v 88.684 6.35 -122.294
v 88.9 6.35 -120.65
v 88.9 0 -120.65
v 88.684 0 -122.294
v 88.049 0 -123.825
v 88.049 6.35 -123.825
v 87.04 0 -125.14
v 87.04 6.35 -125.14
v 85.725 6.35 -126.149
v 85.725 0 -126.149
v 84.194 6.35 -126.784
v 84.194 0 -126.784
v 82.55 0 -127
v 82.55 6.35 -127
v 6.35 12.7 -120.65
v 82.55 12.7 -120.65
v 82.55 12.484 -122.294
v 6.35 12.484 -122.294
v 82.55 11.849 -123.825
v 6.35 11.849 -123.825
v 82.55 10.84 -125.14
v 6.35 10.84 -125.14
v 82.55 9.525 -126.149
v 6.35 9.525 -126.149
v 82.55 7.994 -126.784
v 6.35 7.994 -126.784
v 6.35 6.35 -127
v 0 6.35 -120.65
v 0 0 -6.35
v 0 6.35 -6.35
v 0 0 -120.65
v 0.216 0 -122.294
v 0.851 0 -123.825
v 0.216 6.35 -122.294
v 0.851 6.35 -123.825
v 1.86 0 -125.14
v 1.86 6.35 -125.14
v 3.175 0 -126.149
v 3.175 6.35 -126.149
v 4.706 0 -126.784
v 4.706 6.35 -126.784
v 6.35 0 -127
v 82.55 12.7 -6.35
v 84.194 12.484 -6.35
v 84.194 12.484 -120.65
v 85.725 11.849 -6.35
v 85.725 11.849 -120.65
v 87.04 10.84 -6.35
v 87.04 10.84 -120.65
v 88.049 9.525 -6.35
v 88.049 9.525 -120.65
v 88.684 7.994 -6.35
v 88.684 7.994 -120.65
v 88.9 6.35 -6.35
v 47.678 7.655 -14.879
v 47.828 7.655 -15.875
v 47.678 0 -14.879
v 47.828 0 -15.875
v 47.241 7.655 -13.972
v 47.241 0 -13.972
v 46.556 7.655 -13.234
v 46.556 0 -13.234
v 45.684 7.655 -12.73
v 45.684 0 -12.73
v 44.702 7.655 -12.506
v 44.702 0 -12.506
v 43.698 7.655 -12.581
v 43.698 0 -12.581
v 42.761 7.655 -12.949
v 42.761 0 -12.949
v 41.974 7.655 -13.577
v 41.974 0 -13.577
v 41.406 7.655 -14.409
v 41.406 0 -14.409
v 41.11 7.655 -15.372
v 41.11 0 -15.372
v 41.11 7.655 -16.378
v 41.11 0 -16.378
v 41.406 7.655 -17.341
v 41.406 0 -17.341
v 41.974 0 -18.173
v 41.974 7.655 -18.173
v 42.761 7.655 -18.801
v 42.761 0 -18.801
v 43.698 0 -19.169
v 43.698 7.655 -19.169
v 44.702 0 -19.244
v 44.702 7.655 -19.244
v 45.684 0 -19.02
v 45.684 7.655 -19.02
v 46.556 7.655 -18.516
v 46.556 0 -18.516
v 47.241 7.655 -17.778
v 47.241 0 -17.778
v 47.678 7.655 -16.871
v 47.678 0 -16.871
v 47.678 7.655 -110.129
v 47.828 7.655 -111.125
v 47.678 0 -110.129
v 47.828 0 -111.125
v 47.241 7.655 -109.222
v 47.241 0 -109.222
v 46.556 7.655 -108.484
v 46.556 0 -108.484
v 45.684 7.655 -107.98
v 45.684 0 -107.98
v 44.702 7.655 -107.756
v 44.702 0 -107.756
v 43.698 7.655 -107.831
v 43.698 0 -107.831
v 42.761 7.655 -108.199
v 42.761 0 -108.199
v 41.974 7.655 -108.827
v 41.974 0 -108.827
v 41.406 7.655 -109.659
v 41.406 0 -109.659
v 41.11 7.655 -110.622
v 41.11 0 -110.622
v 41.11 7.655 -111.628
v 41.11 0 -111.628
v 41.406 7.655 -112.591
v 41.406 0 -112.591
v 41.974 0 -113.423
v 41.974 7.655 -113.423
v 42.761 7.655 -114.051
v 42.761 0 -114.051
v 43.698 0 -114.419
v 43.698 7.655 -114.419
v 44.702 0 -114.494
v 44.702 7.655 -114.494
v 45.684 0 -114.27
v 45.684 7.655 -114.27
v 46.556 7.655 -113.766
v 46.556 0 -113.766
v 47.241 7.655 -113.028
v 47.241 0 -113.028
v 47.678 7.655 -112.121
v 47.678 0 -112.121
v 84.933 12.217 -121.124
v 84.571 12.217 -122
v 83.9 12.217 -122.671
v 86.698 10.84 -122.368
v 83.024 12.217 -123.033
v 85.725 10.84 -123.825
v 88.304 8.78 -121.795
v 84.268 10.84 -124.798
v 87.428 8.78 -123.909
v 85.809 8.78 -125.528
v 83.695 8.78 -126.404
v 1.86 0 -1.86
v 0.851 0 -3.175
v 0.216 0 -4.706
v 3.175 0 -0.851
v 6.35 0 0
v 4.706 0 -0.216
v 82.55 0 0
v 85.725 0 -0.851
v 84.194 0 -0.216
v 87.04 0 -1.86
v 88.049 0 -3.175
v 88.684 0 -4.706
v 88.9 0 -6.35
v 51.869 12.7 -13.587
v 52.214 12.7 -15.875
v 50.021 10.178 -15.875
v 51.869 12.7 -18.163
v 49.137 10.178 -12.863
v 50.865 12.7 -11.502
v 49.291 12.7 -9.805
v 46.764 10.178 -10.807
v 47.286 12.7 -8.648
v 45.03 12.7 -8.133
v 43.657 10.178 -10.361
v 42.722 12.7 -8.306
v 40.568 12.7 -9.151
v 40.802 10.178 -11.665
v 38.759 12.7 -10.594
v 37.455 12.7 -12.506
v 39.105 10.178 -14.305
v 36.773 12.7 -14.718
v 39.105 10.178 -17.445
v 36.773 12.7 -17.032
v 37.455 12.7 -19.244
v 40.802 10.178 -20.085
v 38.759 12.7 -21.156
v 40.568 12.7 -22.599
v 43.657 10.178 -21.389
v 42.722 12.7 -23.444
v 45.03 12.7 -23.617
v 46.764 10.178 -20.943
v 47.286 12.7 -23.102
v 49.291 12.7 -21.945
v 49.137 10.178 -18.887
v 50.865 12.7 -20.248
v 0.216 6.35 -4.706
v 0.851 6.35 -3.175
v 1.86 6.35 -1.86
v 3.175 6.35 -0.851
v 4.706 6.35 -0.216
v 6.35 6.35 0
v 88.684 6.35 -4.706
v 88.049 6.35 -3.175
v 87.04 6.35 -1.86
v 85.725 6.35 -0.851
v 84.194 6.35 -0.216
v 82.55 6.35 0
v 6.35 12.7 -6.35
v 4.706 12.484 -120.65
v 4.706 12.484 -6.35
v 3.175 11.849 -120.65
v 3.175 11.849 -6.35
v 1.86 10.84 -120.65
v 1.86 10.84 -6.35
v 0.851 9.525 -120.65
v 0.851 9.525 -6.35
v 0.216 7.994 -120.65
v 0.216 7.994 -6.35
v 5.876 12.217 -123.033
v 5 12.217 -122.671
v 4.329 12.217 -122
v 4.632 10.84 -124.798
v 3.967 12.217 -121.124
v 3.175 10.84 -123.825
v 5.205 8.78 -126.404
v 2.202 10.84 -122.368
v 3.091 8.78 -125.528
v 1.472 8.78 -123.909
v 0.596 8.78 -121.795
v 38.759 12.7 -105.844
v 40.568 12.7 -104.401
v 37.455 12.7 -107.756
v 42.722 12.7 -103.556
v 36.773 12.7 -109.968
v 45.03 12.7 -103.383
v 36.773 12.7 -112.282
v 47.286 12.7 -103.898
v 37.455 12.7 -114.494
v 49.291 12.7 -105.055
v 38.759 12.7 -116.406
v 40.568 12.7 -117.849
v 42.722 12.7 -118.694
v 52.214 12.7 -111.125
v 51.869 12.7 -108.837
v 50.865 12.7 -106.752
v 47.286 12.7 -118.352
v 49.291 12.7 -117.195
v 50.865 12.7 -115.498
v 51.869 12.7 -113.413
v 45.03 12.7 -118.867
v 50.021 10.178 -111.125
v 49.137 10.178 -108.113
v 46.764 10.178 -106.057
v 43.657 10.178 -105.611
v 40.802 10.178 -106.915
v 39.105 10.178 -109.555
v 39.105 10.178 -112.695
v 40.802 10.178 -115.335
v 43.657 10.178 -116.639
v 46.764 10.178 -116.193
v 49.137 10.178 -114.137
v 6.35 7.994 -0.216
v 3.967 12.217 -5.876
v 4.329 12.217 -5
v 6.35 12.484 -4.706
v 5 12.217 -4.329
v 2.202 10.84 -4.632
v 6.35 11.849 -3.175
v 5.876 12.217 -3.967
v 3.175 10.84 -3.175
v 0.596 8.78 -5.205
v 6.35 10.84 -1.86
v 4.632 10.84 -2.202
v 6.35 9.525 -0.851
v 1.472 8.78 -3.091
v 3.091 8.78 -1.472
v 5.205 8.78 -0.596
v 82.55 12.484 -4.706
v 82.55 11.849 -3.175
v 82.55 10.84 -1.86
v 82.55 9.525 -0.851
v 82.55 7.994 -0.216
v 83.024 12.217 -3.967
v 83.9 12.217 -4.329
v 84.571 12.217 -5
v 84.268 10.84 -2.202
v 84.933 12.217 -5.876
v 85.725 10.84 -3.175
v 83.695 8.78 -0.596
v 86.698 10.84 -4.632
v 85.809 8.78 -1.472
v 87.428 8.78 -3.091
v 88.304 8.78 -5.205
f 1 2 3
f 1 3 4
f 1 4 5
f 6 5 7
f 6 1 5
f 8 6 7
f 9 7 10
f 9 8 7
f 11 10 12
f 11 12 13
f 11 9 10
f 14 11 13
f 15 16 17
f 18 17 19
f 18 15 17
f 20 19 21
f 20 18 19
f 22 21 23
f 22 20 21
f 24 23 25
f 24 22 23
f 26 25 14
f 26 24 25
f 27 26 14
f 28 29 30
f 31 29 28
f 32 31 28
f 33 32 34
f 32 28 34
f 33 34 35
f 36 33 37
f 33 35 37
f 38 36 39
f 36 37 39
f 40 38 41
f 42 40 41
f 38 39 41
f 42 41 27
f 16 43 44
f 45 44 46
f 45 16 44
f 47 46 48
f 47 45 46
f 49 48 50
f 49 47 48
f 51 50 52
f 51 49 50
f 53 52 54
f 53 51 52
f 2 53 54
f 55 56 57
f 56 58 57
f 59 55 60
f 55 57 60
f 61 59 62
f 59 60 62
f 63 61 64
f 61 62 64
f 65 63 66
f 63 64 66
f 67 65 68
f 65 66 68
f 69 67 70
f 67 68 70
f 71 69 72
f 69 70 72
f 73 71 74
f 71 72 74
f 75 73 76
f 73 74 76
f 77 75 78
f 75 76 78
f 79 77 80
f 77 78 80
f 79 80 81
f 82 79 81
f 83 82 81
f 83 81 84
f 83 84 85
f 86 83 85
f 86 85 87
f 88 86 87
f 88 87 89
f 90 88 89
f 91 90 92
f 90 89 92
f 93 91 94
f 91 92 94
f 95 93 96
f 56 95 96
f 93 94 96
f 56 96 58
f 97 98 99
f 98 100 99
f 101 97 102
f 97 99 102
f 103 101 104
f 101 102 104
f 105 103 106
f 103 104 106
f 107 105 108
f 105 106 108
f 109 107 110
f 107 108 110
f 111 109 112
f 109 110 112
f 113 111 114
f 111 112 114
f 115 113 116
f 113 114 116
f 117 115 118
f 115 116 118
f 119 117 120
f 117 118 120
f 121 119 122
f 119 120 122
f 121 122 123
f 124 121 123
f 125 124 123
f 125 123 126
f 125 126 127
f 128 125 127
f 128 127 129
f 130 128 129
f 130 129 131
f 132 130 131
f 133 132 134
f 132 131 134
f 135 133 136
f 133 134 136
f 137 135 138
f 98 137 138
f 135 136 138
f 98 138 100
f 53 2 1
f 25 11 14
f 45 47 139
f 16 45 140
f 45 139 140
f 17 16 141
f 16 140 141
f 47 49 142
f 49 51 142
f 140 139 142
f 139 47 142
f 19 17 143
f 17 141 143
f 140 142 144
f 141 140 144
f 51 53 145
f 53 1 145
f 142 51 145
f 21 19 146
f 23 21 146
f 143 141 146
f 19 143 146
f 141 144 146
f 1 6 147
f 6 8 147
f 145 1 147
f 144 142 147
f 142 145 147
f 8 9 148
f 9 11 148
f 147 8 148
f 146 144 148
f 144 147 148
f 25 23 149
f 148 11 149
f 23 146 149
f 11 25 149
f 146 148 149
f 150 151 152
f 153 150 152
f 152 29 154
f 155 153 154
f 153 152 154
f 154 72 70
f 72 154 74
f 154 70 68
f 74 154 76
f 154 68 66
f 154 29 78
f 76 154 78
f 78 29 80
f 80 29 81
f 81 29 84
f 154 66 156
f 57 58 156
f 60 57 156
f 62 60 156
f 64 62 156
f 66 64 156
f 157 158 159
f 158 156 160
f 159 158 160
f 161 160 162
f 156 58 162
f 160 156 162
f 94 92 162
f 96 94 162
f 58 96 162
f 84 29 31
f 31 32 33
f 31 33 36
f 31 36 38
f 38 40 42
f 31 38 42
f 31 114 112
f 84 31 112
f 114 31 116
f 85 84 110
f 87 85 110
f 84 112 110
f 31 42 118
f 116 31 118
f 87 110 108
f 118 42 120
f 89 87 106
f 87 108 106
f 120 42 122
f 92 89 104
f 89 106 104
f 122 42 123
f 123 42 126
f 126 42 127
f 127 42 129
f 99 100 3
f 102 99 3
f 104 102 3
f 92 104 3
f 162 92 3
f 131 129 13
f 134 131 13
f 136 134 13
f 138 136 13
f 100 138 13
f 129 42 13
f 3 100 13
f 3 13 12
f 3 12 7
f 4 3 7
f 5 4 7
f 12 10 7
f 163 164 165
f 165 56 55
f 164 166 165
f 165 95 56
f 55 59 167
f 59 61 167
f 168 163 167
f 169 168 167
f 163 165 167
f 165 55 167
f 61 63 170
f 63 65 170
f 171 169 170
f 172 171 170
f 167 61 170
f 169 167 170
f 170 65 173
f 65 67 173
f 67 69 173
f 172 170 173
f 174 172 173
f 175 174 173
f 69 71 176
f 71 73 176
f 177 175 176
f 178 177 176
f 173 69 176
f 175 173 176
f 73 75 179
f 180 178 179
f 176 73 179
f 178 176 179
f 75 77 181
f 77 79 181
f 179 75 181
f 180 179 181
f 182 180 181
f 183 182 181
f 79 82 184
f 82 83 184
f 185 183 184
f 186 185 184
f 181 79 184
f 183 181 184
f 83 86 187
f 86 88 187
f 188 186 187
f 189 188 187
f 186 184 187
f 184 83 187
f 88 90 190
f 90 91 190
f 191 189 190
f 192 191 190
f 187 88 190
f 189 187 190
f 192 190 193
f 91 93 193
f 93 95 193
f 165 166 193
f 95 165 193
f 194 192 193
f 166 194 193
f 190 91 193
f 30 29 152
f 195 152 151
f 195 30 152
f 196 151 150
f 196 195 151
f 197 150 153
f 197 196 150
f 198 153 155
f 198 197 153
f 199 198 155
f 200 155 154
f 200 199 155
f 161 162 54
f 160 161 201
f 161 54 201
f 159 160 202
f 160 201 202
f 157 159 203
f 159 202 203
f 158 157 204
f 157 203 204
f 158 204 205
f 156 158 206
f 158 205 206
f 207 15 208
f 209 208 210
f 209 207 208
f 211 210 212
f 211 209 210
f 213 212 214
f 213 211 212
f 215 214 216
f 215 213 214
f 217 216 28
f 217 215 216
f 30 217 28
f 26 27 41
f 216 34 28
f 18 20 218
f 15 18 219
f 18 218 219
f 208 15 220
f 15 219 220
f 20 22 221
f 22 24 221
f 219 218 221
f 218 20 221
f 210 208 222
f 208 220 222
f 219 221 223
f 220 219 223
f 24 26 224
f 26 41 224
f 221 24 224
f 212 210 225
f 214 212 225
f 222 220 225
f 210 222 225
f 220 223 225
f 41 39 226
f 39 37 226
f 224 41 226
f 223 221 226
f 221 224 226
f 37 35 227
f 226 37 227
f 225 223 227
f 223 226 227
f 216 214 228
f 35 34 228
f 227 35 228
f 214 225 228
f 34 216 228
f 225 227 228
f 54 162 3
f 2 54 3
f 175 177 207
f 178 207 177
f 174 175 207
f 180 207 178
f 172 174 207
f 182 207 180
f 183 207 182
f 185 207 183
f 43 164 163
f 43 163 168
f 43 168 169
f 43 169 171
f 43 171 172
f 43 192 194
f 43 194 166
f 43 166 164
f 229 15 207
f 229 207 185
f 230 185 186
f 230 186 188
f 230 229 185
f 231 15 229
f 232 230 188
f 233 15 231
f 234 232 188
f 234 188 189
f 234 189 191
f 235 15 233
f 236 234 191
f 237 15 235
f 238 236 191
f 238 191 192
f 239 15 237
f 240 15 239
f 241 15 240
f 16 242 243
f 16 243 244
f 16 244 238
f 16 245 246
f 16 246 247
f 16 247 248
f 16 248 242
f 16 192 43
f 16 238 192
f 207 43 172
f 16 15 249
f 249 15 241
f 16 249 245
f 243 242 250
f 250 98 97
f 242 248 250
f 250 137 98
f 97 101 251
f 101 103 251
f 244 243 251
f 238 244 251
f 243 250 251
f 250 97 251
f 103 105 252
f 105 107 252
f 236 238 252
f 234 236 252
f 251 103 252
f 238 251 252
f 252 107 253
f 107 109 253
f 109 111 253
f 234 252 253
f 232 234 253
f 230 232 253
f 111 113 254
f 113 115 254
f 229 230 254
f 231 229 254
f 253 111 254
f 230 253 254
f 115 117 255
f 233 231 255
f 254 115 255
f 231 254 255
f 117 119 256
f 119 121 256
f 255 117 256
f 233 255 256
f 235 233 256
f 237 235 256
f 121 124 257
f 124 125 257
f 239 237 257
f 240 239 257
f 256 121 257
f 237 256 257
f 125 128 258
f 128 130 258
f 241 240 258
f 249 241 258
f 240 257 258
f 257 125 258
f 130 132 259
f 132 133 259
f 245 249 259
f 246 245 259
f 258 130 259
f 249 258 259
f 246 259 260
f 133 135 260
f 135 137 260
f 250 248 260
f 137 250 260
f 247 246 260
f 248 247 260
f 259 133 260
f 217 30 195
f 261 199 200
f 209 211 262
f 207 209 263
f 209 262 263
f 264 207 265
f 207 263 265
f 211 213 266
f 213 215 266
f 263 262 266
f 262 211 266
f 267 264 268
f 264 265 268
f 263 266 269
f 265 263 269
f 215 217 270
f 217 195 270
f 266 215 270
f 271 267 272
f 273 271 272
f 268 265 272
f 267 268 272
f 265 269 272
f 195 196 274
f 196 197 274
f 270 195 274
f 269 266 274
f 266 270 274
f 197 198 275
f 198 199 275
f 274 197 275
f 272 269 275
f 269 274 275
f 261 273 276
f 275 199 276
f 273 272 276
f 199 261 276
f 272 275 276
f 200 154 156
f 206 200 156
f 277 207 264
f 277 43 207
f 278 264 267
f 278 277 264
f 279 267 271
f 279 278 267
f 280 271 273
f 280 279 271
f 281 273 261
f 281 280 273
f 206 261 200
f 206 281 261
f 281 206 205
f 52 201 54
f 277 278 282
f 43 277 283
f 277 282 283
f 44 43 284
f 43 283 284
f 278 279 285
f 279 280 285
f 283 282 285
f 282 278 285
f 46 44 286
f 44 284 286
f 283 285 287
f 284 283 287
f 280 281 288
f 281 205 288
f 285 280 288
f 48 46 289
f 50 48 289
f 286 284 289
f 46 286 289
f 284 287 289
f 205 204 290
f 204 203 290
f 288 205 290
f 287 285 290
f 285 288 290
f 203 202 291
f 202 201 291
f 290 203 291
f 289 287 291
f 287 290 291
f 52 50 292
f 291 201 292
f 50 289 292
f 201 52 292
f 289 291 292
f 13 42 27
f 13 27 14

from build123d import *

# Parameters (mm, degrees)
SKETCH1_W                                        = 88.9
SKETCH1_H                                        = 127
BOSS_EXTRUDE1_DEPTH                              = 12.7
CSK_FOR_1_4_FLAT_HEAD_MACHINE_SCREW1_D           = 6.7564
CSK_FOR_1_4_FLAT_HEAD_MACHINE_SCREW1_CSINK_D     = 15.5273756
CSK_FOR_1_4_FLAT_HEAD_MACHINE_SCREW1_CSINK_ANGLE = 82
FILLET1_R                                        = 6.35
FILLET2_R                                        = 6.35


with BuildPart() as part:
    # Sketch1 → Boss-Extrude1 (new body)
    with BuildSketch(Plane(origin=(0, 0, 0), x_dir=(1, 0, 0), z_dir=(0, 1, 0))):
        with Locations((44.45, 63.5)):
            Rectangle(SKETCH1_W, SKETCH1_H)
    extrude(amount=BOSS_EXTRUDE1_DEPTH)

    # CSK for 1/4 Flat Head Machine Screw1 (through all)
    with Locations(Plane(origin=(0, 12.7, 0), x_dir=(-1, 0, 0), z_dir=(0, 1, 0))):
        with Locations((-44.45, -15.875), (-44.45, -111.125)):
            CounterSinkHole(CSK_FOR_1_4_FLAT_HEAD_MACHINE_SCREW1_D / 2, CSK_FOR_1_4_FLAT_HEAD_MACHINE_SCREW1_CSINK_D / 2, counter_sink_angle=CSK_FOR_1_4_FLAT_HEAD_MACHINE_SCREW1_CSINK_ANGLE)

    # Fillet1
    fillet1_edges = [part.edges().sort_by_distance(p)[0] for p in [
        (0, 6.35, -127),
        (88.9, 6.35, -127),
        (88.9, 6.35, 0),
        (0, 6.35, 0),
    ]]
    fillet(fillet1_edges, radius=FILLET1_R)

    # Fillet2
    fillet2_edges = [part.edges().sort_by_distance(p)[0] for p in [
        (44.45, 12.7, 0),
        (0, 12.7, -63.5),
        (88.9, 12.7, -63.5),
        (44.45, 12.7, -127),
        (87.040128061, 12.7, -125.140128061),
        (87.040128061, 12.7, -1.859871939),
        (1.859871939, 12.7, -125.140128061),
        (1.859871939, 12.7, -1.859871939),
    ]]
    fillet(fillet2_edges, radius=FILLET2_R)


solid = part.part
